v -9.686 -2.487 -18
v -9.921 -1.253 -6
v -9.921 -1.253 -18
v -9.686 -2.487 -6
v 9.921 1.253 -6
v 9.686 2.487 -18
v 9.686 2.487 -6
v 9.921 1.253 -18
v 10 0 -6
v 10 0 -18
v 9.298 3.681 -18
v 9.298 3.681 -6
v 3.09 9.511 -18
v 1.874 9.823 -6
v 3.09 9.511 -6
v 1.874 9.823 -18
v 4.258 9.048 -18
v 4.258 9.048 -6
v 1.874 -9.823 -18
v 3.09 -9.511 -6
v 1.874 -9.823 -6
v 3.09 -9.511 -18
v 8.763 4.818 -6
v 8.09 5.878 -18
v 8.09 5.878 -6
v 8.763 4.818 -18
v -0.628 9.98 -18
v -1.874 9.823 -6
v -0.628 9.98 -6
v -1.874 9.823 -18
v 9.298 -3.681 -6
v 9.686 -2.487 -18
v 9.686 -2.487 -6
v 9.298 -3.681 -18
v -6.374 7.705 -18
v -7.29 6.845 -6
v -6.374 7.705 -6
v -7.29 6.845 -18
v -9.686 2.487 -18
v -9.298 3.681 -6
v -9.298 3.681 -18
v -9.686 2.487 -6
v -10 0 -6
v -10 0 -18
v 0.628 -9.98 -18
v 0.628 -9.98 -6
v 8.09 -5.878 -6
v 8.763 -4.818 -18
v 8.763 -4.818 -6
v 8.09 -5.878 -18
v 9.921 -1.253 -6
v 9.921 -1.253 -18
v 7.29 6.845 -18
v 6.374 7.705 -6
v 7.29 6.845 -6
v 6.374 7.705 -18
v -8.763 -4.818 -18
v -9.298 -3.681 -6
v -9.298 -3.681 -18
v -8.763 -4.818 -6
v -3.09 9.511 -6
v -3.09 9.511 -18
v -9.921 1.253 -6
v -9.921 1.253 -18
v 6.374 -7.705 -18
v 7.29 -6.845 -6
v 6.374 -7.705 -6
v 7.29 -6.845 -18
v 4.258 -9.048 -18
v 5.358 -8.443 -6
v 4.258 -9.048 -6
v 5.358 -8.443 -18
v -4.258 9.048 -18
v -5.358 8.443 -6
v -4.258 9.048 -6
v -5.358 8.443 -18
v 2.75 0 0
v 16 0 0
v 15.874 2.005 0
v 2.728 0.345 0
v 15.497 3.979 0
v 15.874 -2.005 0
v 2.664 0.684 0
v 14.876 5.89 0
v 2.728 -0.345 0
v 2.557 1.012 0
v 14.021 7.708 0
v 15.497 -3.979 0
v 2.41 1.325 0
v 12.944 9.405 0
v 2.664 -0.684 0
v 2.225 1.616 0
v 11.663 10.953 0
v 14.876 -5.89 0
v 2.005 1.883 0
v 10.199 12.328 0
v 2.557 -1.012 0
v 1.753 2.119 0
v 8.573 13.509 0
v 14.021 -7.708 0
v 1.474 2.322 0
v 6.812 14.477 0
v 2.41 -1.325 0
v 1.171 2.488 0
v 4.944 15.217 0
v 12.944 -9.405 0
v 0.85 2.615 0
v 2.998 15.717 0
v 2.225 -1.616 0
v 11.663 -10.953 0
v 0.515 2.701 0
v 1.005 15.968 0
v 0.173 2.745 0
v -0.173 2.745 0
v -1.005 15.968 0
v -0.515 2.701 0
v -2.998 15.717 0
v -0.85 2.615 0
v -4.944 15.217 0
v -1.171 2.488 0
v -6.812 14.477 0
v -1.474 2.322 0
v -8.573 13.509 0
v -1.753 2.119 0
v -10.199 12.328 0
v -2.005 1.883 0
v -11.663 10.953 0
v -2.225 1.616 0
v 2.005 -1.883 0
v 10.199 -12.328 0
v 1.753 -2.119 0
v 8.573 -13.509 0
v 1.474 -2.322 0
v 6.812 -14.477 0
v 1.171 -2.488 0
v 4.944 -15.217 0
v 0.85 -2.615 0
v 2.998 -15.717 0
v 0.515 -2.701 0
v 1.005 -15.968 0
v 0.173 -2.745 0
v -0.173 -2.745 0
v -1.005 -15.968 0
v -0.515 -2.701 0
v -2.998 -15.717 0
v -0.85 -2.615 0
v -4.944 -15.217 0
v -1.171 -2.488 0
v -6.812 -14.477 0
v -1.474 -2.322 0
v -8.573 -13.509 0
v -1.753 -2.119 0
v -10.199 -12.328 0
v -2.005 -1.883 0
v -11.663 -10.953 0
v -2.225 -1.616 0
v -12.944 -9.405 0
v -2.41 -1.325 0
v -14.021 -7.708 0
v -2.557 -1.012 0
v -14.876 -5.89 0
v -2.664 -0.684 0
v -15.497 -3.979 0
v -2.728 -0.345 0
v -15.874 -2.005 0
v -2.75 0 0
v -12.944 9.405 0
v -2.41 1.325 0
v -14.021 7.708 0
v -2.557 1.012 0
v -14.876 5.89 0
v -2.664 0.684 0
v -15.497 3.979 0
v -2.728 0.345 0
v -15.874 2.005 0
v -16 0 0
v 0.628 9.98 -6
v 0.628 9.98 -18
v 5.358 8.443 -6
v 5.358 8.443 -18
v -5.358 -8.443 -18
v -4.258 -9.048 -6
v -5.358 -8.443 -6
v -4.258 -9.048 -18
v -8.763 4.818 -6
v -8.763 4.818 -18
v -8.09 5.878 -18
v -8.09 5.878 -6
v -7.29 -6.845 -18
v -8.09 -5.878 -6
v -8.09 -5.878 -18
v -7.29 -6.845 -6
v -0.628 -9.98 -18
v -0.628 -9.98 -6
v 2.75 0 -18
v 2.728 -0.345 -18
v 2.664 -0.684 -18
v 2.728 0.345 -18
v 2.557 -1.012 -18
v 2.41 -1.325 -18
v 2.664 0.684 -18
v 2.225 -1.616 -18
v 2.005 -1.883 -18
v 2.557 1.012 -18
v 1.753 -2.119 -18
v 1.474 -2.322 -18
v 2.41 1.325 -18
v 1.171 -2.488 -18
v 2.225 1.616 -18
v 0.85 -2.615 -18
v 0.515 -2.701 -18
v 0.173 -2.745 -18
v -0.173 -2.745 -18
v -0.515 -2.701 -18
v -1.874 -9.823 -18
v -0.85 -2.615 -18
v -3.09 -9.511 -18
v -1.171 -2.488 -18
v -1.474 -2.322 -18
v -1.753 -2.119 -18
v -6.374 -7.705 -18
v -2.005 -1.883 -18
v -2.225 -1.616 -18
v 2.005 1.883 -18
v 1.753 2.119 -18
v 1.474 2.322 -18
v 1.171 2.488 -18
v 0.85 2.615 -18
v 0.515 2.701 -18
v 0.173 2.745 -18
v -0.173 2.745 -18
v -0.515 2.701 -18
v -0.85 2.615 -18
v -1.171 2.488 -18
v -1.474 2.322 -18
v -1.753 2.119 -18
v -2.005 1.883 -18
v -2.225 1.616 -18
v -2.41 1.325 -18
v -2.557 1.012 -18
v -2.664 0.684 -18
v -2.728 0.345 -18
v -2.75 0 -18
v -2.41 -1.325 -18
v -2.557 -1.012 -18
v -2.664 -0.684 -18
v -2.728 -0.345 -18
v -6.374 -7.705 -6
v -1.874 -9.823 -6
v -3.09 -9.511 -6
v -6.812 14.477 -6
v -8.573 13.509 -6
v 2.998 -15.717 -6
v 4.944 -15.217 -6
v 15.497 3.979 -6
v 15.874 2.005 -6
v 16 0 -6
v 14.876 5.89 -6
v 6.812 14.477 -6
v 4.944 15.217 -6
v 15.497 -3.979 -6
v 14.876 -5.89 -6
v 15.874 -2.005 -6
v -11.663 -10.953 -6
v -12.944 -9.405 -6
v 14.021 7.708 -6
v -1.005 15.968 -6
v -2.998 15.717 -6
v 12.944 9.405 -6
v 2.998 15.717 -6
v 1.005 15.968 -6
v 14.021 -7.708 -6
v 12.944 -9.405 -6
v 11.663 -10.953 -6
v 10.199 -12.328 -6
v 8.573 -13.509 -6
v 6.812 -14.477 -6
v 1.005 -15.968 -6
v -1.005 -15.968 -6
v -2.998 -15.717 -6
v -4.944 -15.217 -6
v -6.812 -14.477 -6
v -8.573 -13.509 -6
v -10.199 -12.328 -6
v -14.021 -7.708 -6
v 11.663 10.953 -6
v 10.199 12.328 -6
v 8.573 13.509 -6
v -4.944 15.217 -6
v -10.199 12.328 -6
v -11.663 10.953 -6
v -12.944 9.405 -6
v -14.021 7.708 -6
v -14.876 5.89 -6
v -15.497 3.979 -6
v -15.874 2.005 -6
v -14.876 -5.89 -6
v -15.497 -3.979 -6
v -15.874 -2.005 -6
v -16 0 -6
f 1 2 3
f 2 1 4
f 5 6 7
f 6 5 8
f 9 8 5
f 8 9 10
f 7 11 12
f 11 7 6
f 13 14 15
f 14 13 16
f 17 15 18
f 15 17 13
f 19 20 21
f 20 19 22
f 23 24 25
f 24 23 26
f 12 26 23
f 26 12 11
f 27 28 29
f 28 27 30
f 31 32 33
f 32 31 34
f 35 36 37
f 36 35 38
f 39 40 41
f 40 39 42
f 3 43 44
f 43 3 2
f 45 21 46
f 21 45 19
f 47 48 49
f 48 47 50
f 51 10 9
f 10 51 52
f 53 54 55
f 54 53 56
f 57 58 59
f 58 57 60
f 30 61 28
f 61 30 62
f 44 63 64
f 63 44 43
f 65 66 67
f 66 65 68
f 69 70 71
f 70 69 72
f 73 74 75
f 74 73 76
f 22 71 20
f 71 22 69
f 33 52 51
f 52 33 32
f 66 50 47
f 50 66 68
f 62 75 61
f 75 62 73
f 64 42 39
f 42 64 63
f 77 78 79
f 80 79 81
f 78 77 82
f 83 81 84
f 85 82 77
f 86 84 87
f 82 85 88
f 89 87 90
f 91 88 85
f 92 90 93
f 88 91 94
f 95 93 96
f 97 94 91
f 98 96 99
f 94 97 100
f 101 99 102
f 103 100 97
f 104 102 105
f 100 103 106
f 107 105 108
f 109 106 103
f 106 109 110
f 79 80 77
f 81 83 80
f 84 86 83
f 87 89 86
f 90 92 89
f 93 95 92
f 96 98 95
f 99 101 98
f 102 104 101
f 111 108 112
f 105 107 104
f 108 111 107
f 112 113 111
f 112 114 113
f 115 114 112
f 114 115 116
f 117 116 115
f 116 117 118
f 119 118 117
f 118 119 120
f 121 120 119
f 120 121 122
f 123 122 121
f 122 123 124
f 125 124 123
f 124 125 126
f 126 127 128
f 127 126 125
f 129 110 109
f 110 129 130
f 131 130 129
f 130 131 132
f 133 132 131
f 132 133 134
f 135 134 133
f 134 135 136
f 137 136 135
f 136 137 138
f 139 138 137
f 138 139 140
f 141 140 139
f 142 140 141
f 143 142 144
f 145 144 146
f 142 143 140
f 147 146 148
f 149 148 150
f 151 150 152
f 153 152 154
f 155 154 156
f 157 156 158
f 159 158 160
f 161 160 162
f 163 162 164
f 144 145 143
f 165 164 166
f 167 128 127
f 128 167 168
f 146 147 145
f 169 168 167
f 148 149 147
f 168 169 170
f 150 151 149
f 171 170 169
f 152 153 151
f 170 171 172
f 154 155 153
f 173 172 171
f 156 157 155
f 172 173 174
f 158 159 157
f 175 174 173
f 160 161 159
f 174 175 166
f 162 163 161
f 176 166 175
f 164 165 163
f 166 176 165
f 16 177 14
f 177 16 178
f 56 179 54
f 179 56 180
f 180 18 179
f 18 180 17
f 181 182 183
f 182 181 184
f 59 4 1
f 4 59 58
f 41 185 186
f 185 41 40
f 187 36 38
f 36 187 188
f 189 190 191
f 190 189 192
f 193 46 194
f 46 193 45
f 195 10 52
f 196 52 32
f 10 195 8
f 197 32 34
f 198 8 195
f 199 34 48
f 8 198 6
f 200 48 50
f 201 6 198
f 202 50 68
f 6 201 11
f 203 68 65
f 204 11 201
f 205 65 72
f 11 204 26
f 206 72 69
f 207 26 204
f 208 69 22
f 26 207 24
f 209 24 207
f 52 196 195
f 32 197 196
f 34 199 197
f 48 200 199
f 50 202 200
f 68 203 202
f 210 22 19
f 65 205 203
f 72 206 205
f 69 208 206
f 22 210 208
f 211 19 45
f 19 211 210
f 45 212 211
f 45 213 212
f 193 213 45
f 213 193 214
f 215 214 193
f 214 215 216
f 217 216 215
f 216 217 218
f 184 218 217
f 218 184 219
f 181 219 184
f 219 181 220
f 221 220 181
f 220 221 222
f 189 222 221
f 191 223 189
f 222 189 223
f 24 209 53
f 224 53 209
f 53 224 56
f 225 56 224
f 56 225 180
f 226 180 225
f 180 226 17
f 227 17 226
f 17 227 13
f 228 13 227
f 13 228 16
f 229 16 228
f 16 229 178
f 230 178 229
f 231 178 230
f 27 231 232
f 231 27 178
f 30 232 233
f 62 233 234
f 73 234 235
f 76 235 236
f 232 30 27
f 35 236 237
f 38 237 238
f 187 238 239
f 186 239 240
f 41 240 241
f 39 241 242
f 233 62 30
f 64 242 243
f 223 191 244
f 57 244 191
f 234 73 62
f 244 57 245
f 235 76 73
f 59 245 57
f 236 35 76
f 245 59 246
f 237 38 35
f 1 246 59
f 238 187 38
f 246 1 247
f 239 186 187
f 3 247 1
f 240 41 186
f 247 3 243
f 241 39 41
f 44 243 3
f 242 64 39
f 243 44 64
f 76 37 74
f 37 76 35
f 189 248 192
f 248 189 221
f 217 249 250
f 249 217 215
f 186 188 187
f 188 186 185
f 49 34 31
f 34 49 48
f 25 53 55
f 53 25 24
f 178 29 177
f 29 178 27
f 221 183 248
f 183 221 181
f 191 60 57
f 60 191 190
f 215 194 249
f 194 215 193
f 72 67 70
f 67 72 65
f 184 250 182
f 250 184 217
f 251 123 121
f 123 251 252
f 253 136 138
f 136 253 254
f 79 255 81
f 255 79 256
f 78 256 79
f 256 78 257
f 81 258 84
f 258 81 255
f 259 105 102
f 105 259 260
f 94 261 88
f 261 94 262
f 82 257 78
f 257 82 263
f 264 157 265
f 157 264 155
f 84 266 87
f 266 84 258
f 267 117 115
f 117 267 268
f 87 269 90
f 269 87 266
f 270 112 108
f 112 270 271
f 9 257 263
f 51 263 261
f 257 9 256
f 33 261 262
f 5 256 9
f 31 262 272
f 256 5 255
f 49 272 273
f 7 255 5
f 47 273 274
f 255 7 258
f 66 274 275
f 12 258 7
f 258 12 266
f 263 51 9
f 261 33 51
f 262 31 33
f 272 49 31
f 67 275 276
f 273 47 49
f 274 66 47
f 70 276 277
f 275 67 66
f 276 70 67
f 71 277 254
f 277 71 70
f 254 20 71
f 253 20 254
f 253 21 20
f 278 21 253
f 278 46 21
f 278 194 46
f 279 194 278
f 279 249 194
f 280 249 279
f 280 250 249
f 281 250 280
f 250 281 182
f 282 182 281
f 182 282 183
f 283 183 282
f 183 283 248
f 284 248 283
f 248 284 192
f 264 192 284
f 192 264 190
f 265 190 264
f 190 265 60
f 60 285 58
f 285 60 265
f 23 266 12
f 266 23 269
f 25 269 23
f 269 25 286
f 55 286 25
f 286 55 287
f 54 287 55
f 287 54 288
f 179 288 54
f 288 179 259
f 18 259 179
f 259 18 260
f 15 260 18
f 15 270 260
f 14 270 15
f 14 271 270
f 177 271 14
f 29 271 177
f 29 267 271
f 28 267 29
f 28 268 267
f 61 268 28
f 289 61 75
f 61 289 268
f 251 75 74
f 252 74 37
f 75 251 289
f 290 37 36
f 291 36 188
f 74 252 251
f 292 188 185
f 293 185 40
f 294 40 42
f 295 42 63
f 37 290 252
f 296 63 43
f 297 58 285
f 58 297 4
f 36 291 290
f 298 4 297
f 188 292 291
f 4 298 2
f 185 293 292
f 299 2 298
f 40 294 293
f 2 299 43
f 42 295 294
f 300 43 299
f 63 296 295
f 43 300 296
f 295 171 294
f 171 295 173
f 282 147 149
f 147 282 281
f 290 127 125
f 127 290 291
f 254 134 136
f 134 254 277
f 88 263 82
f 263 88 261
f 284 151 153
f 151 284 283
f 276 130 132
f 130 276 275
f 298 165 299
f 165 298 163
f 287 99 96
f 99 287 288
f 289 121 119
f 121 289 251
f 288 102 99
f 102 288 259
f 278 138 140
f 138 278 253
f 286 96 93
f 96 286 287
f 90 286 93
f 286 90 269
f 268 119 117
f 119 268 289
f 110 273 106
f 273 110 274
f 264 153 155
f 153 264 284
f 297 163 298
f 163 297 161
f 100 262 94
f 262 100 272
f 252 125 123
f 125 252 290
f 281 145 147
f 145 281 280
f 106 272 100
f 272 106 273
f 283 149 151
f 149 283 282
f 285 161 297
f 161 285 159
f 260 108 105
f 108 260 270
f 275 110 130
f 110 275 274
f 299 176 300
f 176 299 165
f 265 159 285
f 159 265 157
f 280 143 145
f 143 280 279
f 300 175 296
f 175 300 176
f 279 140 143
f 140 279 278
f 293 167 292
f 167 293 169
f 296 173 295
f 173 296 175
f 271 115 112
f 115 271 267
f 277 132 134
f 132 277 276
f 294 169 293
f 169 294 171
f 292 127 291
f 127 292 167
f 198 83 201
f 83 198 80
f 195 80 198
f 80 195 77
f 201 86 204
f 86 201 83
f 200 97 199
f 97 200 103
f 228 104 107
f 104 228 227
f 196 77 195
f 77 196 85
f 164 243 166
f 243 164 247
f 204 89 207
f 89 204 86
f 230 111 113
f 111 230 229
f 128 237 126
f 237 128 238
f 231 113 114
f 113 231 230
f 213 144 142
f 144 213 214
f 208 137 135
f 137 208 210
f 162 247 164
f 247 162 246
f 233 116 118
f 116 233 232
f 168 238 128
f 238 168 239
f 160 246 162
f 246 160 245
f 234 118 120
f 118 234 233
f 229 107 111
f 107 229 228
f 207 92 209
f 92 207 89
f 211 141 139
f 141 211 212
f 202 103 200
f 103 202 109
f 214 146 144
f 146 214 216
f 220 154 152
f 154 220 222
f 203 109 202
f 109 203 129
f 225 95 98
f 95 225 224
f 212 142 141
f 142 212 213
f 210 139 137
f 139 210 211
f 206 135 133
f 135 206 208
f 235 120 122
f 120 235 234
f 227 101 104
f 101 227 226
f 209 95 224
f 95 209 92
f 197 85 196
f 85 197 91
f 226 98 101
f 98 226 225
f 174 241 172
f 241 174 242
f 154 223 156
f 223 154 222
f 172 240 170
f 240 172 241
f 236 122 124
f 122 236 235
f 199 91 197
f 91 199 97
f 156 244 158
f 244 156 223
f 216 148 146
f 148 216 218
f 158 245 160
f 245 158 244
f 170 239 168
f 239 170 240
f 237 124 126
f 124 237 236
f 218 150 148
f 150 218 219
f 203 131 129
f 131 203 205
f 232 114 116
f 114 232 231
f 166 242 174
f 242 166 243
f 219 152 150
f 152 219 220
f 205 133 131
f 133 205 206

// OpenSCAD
$fn = 50;


difference() {
	union() {
		translate(v = [0, 0, -18.0000000000]) {
			cylinder(h = 18, r = 10.0000000000);
		}
		translate(v = [0, 0, -6.0000000000]) {
			cylinder(h = 6, r = 16.0000000000);
		}
	}
	union() {
		#translate(v = [0, 0, -18]) {
			cylinder(h = 18, r = 2.7500000000);
		}
	}
}
